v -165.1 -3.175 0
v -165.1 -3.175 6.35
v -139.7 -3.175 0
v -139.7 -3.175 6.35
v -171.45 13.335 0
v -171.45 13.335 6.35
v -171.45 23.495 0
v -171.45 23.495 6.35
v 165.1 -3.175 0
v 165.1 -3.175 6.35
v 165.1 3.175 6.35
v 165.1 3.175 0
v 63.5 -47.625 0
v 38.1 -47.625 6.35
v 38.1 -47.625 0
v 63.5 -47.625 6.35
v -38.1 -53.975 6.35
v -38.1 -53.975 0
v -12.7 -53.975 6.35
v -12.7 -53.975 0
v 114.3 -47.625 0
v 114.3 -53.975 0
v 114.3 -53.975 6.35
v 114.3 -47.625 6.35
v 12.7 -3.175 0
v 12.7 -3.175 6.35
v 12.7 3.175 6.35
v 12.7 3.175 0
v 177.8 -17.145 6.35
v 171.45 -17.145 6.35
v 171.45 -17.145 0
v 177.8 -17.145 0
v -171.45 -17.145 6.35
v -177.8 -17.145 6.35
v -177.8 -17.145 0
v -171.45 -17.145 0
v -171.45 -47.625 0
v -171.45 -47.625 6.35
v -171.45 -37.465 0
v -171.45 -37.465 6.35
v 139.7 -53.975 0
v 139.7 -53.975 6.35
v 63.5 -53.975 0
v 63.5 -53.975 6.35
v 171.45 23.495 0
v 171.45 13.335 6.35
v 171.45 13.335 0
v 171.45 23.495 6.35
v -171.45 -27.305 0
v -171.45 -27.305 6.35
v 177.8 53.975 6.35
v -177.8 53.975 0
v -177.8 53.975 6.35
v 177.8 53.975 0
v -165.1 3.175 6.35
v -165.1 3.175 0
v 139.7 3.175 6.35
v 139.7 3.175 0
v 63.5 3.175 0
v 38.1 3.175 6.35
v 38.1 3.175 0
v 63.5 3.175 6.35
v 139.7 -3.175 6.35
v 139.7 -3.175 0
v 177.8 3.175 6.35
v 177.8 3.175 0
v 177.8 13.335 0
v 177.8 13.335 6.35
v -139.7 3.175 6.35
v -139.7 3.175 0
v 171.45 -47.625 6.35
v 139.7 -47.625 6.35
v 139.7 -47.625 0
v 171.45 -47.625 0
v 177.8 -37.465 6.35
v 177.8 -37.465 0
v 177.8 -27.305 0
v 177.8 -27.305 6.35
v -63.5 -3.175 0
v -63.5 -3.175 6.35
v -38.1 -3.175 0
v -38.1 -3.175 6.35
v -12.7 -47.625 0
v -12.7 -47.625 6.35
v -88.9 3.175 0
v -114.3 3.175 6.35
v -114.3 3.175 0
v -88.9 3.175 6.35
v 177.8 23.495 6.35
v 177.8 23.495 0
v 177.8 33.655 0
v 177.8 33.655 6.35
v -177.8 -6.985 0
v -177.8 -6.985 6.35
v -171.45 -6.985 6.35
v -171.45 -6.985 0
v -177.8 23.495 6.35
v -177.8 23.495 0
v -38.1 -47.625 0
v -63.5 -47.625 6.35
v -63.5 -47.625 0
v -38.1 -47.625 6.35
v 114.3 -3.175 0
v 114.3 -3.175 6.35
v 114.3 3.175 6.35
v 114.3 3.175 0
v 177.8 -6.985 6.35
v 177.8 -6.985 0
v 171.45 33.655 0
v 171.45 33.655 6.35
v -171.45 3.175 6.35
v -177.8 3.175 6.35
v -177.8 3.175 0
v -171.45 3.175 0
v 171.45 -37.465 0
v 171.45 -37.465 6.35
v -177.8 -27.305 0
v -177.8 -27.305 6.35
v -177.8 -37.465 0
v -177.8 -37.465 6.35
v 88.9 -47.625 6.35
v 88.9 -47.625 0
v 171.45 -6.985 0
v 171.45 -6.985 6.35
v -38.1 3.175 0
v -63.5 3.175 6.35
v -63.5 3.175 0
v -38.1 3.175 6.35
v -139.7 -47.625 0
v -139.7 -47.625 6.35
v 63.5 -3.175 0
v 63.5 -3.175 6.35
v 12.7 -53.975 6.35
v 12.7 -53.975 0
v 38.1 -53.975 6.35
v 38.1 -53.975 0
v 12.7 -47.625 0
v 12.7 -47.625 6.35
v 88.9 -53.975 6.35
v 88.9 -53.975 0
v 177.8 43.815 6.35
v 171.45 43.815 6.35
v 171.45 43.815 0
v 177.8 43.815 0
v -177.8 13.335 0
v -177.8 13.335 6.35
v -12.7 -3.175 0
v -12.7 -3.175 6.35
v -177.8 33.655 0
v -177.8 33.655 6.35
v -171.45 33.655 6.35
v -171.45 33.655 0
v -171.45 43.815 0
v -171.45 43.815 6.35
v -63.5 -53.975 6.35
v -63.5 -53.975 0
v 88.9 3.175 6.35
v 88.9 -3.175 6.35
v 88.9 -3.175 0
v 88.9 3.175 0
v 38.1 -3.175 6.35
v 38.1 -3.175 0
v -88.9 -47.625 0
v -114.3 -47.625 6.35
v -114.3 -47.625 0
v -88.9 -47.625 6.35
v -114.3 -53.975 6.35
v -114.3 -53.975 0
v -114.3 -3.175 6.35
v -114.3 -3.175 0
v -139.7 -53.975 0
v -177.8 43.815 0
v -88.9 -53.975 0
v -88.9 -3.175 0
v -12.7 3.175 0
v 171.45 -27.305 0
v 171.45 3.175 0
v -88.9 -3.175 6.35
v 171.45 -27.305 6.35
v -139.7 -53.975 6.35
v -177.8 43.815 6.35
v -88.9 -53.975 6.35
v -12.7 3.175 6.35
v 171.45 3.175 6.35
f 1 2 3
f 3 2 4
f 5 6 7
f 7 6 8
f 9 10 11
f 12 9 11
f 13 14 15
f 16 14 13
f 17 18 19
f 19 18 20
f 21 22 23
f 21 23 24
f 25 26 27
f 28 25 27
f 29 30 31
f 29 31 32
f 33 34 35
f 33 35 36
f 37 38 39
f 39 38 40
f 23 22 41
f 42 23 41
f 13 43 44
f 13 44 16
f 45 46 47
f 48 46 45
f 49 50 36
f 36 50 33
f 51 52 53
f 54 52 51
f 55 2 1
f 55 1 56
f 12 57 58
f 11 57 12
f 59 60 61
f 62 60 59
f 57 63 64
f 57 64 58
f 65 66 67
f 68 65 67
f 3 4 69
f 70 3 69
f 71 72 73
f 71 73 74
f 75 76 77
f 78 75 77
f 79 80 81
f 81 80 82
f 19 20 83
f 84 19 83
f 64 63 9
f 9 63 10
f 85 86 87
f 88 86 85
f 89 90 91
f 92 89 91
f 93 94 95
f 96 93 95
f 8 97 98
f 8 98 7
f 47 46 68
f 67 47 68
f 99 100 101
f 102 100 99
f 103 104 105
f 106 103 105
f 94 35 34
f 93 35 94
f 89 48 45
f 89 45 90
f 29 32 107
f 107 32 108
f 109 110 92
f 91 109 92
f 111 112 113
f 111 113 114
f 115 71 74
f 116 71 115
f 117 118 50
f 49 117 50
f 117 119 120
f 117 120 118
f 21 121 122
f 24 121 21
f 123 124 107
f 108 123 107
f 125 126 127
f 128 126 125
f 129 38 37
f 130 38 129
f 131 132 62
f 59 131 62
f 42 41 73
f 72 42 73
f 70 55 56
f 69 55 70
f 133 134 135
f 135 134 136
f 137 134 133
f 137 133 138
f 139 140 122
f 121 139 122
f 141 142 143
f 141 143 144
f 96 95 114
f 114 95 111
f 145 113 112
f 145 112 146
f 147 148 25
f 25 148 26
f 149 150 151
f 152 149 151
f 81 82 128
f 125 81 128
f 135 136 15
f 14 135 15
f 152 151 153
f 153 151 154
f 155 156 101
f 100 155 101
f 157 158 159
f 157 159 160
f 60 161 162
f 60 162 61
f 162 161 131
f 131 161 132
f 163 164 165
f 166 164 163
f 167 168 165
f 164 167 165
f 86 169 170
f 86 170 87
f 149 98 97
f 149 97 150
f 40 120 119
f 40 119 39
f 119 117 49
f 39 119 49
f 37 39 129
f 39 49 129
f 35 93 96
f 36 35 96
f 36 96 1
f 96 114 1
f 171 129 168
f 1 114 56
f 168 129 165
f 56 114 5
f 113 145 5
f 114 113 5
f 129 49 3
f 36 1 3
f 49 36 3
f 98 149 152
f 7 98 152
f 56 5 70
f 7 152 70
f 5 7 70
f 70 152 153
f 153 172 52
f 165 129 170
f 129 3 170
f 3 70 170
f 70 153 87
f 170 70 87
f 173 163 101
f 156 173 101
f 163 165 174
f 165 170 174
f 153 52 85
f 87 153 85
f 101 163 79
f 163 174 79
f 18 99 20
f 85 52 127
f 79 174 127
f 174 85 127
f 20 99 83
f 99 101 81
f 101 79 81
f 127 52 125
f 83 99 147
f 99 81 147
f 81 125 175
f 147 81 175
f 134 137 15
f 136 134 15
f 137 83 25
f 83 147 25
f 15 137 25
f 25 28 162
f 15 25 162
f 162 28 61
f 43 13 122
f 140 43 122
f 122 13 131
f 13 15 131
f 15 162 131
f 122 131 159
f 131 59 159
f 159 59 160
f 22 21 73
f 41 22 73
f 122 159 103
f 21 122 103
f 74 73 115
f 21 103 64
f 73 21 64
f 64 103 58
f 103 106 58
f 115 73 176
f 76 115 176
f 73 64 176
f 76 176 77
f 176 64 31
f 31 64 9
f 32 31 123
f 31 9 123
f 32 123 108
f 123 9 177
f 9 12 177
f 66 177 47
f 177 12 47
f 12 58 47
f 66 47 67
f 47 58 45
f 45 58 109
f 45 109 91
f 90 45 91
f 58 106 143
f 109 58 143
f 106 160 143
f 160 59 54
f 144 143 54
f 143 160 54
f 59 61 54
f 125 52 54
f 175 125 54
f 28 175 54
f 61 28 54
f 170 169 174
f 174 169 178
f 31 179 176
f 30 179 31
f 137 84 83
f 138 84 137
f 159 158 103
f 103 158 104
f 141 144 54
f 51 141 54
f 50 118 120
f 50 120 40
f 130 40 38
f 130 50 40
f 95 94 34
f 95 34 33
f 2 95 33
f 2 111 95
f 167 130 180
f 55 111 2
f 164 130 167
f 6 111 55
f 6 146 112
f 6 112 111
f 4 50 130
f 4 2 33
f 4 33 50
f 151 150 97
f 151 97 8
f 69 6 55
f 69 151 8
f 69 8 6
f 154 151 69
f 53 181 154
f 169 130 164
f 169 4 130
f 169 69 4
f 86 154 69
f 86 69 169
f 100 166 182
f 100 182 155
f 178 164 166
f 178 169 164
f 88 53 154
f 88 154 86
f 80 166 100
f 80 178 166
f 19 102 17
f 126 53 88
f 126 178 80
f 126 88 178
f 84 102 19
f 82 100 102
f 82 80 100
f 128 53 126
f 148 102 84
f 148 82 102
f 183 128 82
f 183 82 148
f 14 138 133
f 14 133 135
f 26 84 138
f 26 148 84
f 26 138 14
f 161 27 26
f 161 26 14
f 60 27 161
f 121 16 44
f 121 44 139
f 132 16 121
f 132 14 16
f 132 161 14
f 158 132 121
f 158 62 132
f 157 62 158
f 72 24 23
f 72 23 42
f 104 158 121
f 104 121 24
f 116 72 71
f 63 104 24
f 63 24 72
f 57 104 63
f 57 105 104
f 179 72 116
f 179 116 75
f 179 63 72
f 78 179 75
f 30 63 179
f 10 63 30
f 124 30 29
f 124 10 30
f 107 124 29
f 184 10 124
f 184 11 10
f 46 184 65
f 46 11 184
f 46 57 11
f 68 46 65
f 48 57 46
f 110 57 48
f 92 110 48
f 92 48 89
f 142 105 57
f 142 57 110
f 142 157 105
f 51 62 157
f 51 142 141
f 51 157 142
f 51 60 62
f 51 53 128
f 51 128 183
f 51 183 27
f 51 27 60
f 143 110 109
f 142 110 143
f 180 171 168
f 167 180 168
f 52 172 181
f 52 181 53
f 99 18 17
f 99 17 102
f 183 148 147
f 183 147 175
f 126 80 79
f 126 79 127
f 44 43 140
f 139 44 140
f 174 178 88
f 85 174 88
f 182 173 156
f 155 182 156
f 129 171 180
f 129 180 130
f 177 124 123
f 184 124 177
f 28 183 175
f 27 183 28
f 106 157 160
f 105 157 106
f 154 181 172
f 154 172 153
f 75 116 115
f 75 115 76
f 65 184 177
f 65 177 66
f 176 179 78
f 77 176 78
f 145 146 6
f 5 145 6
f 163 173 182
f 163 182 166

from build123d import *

# Parameters (mm, degrees)
ESQUISSE1_W                     = 355.6
ESQUISSE1_H                     = 107.95
BOSS_EXTRU_1_DEPTH              = 6.35
ESQUISSE4_W                     = 6.35
ESQUISSE4_H                     = 10.16
ENL_V_MAT_EXTRU_3_DEPTH         = 6.35
R_P_TITION_LIN_AIRE2_COUNT      = 7
R_P_TITION_LIN_AIRE2_PITCH      = 20.32
R_P_TITION_LIN_AIRE2_COUNT_DIR2 = 2
R_P_TITION_LIN_AIRE2_PITCH_DIR2 = 349.25
ESQUISSE5_W                     = 25.4
ESQUISSE5_H                     = 6.35
ENL_V_MAT_EXTRU_4_DEPTH         = 6.35
R_P_TITION_LIN_AIRE3_COUNT      = 7
R_P_TITION_LIN_AIRE3_PITCH      = 50.8
ESQUISSE6_W                     = 12.7
ESQUISSE6_H                     = 6.35
ENL_V_MAT_EXTRU_5_DEPTH         = 6.35
ESQUISSE8_W                     = 12.7
ESQUISSE8_H                     = 6.35
ENL_V_MAT_EXTRU_7_DEPTH         = 6.35
ESQUISSE9_W                     = 25.4
ESQUISSE9_H                     = 6.35
ENL_V_MAT_EXTRU_8_DEPTH         = 6.35
R_P_TITION_LIN_AIRE6_COUNT      = 7
R_P_TITION_LIN_AIRE6_PITCH      = 50.8


with BuildPart() as part:
    # Esquisse1 → Boss.-Extru.1 (new body)
    with BuildSketch(Plane.XY):
        Rectangle(ESQUISSE1_W, ESQUISSE1_H)
    extrude(amount=BOSS_EXTRU_1_DEPTH)

    # Esquisse4 → Enlèv. mat.-Extru.3 (cut)
    with BuildSketch(Plane.XY.offset(6.35)):
        with Locations((-174.625, 38.735)):
            Rectangle(ESQUISSE4_W, ESQUISSE4_H)
    enl_v_mat_extru_3 = extrude(amount=-ENL_V_MAT_EXTRU_3_DEPTH, mode=Mode.SUBTRACT)

    # Répétition linéaire2: Enl_v. mat.-Extru.3 7 × 2
    with Locations(*[(j * R_P_TITION_LIN_AIRE2_PITCH_DIR2, -i * R_P_TITION_LIN_AIRE2_PITCH, 0) for i in range(R_P_TITION_LIN_AIRE2_COUNT) for j in range(R_P_TITION_LIN_AIRE2_COUNT_DIR2) if (i, j) != (0, 0)]):
        add(enl_v_mat_extru_3, mode=Mode.SUBTRACT)

    # Esquisse5 → Enlèv. mat.-Extru.4 (cut)
    with BuildSketch(Plane.XY.offset(6.35)):
        with Locations((-152.4, -50.8)):
            Rectangle(ESQUISSE5_W, ESQUISSE5_H)
    enl_v_mat_extru_4 = extrude(amount=-ENL_V_MAT_EXTRU_4_DEPTH, mode=Mode.SUBTRACT)

    # Répétition linéaire3: Enlèv. mat.-Extru.4 ×7
    with Locations(*[(i * R_P_TITION_LIN_AIRE3_PITCH, 0, 0) for i in range(1, R_P_TITION_LIN_AIRE3_COUNT)]):
        add(enl_v_mat_extru_4, mode=Mode.SUBTRACT)

    # Esquisse6 → Enlèv. mat.-Extru.5 (cut)
    with BuildSketch(Plane.XY.offset(6.35)):
        with Locations((-171.45, -50.8)):
            Rectangle(ESQUISSE6_W, ESQUISSE6_H)
    extrude(amount=-ENL_V_MAT_EXTRU_5_DEPTH, mode=Mode.SUBTRACT)

    # Esquisse8 → Enlèv. mat.-Extru.7 (cut)
    with BuildSketch(Plane.XY.offset(6.35)):
        with Locations((171.45, -50.8)):
            Rectangle(ESQUISSE8_W, ESQUISSE8_H)
    extrude(amount=-ENL_V_MAT_EXTRU_7_DEPTH, mode=Mode.SUBTRACT)

    # Esquisse9 → Enlèv. mat.-Extru.8 (cut)
    with BuildSketch(Plane.XY.offset(6.35)):
        with Locations((-152.4, 0)):
            Rectangle(ESQUISSE9_W, ESQUISSE9_H)
    enl_v_mat_extru_8 = extrude(amount=-ENL_V_MAT_EXTRU_8_DEPTH, mode=Mode.SUBTRACT)

    # Répétition linéaire6: Enlèv. mat.-Extru.8 ×7
    with Locations(*[(i * R_P_TITION_LIN_AIRE6_PITCH, 0, 0) for i in range(1, R_P_TITION_LIN_AIRE6_COUNT)]):
        add(enl_v_mat_extru_8, mode=Mode.SUBTRACT)


solid = part.part
